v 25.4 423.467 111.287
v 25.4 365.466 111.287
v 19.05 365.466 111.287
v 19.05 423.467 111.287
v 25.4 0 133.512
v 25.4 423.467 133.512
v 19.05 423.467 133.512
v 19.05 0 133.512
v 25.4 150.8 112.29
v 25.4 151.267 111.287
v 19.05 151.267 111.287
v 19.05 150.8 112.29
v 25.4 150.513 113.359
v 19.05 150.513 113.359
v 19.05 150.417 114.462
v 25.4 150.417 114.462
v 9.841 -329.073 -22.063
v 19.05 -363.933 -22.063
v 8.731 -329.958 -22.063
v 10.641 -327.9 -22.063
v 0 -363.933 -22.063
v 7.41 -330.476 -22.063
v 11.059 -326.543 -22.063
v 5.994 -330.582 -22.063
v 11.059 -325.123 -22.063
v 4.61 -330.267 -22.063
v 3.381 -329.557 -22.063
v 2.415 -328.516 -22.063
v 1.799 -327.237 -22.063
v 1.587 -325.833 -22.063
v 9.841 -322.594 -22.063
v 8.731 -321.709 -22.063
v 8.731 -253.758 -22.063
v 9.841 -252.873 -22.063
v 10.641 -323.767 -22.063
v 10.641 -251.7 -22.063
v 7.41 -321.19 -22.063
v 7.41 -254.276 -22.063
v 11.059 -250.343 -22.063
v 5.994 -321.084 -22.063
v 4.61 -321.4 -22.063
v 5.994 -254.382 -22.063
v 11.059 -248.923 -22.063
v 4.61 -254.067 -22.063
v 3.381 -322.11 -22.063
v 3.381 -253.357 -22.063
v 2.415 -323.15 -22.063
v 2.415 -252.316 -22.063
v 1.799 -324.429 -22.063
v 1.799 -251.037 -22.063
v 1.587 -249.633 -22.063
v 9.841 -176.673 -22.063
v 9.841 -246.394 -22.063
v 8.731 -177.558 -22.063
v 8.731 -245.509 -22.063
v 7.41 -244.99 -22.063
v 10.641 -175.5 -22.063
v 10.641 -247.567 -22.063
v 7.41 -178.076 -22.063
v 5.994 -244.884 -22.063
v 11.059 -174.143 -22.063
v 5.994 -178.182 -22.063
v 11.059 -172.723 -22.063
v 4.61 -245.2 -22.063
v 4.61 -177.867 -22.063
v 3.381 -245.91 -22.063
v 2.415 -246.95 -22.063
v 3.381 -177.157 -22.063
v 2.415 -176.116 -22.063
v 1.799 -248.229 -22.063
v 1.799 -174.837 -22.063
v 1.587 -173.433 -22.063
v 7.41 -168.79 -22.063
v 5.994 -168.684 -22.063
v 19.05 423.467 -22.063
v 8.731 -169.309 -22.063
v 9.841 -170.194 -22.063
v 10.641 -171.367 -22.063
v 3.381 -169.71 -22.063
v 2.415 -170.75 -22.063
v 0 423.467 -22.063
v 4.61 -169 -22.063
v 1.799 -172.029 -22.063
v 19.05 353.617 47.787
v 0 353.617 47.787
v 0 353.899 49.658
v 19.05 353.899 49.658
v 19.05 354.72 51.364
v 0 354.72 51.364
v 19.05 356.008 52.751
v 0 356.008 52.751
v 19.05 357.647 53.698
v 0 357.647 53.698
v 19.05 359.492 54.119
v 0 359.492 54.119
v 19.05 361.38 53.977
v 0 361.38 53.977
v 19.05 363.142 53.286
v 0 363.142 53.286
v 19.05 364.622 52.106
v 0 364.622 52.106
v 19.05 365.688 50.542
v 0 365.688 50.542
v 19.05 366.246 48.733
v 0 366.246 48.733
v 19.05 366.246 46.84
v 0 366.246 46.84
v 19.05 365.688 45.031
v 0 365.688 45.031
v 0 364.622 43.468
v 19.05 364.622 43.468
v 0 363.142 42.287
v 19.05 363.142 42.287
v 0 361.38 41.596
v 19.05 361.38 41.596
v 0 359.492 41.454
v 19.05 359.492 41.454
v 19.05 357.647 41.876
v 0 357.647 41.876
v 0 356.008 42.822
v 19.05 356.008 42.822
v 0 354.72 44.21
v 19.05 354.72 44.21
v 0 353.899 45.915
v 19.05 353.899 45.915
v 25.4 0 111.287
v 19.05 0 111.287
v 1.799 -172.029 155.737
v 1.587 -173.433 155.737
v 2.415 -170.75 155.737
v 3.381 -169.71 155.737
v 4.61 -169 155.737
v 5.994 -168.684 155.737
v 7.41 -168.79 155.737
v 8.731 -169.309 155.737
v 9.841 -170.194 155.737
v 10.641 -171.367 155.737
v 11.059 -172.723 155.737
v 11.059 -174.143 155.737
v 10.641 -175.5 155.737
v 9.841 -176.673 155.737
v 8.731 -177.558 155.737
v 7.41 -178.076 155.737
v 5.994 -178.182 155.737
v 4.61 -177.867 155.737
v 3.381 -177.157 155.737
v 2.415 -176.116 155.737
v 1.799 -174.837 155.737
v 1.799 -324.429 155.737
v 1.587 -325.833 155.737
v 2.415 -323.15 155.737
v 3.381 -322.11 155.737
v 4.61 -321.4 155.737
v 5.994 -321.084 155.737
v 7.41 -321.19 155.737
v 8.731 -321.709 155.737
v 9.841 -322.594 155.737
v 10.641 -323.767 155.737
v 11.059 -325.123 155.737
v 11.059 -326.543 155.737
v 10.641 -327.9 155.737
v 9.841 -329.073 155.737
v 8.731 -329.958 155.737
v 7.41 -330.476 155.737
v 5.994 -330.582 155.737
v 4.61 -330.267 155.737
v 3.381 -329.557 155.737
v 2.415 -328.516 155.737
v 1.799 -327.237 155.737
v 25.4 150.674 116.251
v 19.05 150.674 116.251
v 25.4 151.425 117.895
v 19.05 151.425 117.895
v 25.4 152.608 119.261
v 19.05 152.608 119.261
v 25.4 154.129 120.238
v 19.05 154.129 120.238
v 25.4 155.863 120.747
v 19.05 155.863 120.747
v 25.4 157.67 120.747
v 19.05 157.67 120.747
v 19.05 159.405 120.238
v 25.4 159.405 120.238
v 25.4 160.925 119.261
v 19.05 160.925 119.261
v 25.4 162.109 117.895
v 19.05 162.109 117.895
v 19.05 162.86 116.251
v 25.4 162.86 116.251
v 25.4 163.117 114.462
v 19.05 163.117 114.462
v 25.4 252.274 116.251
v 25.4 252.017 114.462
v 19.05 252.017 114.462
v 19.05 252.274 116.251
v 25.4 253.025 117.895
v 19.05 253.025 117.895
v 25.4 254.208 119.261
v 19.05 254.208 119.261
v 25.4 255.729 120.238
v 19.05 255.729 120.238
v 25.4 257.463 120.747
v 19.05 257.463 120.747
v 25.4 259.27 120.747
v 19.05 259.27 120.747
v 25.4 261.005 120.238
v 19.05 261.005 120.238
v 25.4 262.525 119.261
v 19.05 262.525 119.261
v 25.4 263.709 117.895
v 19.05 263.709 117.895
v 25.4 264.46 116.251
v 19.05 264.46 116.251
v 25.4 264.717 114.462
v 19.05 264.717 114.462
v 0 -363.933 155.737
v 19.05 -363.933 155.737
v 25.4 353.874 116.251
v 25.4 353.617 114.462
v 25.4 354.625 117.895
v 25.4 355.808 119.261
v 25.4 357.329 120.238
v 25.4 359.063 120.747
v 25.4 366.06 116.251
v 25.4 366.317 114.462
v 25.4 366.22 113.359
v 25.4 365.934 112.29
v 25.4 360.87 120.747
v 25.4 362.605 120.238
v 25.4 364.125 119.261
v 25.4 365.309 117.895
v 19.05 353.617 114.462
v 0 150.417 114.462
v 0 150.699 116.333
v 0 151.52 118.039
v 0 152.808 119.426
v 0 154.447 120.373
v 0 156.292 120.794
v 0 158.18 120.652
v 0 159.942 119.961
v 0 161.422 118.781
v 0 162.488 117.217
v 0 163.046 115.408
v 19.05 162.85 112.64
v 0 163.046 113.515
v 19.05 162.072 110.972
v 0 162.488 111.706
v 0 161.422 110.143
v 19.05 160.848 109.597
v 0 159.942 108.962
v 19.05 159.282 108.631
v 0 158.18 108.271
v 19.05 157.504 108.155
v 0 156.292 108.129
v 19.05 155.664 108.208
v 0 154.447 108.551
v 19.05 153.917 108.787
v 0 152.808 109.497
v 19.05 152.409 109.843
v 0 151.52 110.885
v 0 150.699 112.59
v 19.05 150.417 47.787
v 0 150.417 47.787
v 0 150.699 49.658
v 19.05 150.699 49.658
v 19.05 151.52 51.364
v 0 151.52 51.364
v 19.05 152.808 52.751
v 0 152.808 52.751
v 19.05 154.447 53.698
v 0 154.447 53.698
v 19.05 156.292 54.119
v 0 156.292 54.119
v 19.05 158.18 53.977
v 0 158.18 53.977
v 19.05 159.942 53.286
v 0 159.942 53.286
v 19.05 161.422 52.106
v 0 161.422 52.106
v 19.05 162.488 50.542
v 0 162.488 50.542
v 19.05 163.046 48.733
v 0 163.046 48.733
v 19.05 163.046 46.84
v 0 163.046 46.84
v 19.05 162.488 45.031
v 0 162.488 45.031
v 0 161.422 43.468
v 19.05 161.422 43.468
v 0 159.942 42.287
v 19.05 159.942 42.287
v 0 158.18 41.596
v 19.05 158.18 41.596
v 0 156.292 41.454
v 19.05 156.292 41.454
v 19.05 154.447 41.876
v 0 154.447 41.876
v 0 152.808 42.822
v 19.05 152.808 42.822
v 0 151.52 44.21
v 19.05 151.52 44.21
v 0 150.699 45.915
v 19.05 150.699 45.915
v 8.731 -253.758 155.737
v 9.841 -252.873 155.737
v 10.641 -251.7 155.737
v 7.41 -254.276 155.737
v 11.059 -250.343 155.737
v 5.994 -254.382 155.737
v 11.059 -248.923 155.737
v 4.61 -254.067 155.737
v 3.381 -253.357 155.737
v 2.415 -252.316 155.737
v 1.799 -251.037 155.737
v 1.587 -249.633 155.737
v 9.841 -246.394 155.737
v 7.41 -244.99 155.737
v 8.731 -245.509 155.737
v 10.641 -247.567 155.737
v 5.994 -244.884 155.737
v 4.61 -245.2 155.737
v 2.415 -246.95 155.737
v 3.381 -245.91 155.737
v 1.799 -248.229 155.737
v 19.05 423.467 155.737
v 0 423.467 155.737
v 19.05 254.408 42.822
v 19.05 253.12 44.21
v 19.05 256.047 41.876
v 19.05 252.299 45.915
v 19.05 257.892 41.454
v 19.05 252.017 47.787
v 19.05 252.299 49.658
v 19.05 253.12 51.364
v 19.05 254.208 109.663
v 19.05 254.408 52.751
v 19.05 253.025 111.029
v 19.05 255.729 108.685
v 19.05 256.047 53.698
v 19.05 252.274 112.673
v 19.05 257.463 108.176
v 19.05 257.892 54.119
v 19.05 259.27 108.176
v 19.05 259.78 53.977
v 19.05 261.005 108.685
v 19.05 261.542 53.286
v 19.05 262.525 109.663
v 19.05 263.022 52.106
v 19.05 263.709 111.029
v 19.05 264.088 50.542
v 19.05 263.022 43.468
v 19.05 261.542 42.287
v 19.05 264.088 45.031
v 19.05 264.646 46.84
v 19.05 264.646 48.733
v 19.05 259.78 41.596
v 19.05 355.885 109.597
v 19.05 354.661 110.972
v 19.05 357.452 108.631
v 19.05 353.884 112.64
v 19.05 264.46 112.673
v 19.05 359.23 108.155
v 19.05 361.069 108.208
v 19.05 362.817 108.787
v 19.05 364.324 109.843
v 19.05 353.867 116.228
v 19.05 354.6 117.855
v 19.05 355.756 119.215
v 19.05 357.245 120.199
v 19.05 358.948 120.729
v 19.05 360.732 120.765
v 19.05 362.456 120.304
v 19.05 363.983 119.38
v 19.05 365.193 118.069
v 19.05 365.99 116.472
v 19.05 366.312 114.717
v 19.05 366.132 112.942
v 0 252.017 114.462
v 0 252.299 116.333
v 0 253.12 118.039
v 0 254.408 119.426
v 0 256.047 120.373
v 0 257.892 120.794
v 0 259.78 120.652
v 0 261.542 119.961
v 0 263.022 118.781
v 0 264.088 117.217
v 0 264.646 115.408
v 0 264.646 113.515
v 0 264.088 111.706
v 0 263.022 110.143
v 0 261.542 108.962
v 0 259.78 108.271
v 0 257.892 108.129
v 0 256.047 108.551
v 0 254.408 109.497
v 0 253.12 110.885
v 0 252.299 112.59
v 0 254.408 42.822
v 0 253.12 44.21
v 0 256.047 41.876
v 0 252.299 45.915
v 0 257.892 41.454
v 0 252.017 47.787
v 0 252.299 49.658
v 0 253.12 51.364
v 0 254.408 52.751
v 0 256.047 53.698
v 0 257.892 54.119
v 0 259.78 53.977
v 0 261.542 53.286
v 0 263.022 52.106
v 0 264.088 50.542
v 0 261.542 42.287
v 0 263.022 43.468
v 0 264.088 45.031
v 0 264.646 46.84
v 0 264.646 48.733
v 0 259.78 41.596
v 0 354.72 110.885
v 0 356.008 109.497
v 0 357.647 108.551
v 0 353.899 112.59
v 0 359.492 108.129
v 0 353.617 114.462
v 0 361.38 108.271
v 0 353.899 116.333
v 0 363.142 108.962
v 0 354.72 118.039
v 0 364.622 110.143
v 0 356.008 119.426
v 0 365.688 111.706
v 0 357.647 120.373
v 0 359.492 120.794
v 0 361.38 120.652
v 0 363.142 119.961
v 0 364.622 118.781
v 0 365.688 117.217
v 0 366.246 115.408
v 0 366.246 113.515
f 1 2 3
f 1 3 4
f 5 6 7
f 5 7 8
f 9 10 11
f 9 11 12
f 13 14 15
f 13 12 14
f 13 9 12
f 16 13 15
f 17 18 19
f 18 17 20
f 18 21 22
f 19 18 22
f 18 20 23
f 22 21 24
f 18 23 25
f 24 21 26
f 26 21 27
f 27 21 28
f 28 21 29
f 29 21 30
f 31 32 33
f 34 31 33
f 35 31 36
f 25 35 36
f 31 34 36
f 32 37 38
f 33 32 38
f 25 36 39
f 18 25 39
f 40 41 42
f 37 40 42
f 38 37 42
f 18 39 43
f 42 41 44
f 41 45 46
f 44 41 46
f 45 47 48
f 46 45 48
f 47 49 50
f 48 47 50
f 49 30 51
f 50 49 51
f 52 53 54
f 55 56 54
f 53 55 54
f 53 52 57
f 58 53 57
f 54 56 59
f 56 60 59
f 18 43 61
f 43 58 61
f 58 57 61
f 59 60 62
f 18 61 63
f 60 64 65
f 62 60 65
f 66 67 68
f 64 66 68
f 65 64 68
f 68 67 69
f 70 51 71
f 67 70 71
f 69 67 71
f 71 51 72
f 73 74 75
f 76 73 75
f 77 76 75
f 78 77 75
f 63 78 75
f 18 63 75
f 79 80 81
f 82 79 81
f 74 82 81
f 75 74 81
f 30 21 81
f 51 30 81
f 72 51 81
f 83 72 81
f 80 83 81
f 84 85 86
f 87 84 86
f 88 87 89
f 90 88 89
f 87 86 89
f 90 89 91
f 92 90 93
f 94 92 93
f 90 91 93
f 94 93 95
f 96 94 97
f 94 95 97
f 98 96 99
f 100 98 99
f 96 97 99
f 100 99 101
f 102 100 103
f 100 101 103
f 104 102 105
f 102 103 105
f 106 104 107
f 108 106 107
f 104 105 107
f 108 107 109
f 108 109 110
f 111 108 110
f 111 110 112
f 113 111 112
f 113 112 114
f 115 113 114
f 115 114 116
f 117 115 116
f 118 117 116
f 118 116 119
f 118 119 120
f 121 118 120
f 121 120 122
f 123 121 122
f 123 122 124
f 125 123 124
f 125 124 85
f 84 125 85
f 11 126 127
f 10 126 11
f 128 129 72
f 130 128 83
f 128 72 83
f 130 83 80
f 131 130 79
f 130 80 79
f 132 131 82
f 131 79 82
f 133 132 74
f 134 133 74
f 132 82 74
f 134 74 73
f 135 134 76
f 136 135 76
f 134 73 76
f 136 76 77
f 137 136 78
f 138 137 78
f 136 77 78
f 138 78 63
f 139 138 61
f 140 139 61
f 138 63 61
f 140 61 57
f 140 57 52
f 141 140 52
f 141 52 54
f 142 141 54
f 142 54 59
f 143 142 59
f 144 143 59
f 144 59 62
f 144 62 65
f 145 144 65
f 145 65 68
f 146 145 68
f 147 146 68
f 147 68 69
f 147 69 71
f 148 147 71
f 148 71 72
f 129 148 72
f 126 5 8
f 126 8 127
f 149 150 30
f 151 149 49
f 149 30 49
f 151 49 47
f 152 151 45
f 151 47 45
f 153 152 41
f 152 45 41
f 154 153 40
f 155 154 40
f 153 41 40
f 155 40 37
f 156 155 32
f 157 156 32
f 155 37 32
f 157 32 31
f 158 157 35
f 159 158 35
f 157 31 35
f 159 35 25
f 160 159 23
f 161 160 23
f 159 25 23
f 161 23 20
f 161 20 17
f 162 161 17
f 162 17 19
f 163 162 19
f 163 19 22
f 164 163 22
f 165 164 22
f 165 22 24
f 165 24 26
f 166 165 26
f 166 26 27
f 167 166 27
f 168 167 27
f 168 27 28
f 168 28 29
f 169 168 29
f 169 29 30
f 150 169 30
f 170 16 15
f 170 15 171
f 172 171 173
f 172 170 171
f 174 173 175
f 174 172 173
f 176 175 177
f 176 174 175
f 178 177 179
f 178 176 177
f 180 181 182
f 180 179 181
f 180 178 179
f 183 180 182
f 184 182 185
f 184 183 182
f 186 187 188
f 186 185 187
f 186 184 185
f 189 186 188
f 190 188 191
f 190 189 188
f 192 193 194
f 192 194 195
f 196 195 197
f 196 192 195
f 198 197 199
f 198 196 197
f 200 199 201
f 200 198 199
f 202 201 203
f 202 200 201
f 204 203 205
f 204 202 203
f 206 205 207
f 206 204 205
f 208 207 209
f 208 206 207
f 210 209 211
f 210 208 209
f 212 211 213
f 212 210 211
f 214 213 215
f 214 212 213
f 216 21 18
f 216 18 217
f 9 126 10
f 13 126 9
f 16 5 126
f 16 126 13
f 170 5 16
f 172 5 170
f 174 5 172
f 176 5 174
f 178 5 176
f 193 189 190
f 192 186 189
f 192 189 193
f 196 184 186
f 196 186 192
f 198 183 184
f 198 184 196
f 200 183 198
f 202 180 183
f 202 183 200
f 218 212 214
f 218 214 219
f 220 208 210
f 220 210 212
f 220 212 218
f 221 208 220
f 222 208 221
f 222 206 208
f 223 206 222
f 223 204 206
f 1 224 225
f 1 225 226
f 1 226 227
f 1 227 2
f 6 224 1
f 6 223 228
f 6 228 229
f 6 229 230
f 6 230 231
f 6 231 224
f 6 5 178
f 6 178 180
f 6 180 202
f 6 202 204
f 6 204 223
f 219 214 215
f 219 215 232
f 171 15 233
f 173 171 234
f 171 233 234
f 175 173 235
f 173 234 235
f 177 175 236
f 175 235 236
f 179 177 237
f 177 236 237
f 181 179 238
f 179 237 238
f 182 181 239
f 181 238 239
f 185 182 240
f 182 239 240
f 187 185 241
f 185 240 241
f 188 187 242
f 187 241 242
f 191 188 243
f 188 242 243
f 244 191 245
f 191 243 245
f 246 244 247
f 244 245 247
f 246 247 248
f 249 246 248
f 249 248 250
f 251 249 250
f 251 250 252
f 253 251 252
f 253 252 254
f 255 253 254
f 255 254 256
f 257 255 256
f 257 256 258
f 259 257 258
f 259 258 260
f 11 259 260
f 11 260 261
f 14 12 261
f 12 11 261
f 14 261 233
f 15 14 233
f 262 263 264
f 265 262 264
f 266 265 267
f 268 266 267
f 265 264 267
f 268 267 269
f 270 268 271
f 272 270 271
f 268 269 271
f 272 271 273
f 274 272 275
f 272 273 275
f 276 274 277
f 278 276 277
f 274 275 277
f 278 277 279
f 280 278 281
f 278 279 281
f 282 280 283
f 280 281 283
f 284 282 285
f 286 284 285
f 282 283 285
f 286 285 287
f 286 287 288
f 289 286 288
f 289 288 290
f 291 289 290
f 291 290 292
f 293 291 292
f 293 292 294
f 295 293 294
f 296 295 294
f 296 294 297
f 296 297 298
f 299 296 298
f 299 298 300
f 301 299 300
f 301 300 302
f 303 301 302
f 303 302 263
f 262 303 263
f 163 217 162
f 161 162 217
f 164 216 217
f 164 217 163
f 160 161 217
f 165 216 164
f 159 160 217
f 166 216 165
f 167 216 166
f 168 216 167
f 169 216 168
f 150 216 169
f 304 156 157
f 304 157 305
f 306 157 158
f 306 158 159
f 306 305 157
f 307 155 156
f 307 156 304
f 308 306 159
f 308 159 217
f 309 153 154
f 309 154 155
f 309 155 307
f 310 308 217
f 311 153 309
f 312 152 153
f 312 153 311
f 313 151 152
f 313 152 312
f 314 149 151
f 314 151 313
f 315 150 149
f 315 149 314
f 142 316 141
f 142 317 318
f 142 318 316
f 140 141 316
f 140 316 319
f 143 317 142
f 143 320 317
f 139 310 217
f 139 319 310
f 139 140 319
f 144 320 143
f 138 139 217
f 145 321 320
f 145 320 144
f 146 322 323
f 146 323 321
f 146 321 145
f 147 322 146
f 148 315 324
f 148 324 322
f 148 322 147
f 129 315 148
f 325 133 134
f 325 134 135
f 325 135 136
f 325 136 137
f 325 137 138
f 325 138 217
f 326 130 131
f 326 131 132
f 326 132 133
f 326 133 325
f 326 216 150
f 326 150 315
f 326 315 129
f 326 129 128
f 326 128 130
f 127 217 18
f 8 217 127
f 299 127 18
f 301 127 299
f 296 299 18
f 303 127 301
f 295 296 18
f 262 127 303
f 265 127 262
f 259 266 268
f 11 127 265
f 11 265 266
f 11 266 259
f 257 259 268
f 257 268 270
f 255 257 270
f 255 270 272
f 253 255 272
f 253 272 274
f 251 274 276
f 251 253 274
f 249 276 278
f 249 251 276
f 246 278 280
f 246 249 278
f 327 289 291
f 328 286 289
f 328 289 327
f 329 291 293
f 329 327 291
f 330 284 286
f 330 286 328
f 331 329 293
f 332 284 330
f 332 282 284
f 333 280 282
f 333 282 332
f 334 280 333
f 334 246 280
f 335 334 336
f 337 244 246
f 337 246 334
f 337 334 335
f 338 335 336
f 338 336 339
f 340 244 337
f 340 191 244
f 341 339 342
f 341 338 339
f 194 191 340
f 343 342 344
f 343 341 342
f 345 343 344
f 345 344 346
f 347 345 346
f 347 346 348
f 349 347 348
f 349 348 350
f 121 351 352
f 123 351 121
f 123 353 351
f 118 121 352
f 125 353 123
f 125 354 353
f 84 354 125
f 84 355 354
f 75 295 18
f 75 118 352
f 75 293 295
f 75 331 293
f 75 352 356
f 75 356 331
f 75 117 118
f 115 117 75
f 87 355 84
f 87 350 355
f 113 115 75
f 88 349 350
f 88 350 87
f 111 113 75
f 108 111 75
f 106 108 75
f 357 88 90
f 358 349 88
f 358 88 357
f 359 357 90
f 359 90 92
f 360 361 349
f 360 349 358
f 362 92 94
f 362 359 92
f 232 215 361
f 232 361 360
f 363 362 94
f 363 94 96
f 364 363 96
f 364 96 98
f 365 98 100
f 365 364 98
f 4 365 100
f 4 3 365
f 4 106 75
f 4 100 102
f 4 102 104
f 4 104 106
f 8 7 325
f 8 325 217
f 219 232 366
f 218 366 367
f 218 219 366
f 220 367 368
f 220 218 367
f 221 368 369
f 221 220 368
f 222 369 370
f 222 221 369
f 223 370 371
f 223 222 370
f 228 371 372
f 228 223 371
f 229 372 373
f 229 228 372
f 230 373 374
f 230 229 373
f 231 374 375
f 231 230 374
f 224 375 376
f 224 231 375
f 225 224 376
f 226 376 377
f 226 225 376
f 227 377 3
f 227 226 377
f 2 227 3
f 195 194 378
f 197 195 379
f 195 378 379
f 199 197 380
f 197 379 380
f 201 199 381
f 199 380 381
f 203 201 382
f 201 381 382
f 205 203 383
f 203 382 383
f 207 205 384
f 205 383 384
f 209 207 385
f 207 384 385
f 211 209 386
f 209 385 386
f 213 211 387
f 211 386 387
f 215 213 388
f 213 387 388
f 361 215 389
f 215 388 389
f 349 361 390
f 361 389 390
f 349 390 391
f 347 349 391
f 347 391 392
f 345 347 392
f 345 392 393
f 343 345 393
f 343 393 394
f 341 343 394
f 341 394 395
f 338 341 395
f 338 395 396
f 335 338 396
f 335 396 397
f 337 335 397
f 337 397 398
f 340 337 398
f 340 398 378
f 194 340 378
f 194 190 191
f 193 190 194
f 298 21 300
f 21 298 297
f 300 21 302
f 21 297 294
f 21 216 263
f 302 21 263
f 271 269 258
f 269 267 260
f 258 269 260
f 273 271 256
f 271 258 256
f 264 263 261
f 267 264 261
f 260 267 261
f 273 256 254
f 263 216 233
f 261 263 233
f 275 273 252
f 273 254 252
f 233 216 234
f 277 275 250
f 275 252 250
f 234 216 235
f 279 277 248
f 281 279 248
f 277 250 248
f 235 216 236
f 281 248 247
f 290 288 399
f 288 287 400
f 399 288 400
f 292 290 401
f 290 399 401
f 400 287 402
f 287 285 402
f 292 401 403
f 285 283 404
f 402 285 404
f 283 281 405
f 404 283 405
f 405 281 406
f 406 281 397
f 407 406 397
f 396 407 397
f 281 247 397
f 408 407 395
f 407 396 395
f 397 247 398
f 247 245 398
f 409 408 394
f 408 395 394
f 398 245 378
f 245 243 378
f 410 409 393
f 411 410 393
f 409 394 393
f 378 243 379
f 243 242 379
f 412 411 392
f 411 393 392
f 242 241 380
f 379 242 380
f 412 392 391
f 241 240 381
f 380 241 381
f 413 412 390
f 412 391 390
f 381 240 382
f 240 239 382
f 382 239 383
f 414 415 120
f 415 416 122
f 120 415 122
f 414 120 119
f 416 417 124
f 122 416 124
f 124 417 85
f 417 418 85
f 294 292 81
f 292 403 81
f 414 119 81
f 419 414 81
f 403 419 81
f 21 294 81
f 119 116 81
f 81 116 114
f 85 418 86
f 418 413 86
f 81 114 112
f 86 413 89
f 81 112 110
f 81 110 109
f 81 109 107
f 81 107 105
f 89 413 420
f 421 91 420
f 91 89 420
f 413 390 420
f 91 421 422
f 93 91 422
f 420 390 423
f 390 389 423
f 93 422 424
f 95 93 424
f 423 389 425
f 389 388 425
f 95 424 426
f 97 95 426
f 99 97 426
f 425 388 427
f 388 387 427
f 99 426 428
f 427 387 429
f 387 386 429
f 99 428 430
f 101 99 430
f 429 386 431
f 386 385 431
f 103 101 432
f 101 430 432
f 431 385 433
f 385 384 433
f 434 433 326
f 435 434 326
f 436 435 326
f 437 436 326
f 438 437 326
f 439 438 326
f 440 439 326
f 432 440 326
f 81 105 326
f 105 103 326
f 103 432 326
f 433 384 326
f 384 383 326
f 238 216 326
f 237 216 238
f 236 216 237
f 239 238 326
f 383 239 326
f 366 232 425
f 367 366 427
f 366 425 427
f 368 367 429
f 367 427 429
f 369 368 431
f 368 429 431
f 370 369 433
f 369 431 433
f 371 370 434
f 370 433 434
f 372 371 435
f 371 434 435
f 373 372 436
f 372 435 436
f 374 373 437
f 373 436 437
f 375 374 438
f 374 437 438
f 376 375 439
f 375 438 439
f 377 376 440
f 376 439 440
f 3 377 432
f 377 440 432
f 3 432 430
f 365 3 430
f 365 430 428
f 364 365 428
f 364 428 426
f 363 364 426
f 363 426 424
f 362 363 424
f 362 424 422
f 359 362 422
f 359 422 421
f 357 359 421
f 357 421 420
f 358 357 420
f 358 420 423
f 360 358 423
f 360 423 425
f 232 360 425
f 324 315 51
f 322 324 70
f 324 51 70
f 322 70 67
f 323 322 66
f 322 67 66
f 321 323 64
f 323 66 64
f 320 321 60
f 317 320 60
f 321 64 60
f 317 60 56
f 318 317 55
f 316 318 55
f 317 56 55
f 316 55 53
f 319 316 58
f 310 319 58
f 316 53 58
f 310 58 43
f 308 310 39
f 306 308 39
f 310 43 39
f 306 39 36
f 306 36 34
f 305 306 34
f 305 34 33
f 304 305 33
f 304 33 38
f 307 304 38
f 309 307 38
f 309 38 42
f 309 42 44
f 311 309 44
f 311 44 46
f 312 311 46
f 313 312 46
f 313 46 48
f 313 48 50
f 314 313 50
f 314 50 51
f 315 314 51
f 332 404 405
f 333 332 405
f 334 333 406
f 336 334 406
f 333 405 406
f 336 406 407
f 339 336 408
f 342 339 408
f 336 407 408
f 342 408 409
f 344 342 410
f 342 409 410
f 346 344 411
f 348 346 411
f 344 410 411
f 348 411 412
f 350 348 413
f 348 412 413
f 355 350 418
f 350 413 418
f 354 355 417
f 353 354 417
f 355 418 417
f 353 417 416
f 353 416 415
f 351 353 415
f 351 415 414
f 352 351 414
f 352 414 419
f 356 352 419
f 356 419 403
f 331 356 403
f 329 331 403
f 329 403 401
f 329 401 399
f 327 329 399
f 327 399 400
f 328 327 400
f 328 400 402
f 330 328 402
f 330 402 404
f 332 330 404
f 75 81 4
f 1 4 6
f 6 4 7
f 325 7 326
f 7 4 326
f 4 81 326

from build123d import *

# Parameters (mm, degrees)
F0_W     = 787.4
F0_H     = 177.8
F1_DEPTH = 19.05
F4_D     = 12.7
F5_D     = 9.525
F7_DEPTH = 6.35
F8_D     = 12.7


with BuildPart() as f1:
    # F0 (on Right) → F1 (new body)
    with BuildSketch(Plane.YZ):
        with Locations((29.7667551786, 66.8366326568)):
            Rectangle(F0_W, F0_H)
    extrude(amount=F1_DEPTH)

    # F4 (through all)
    with Locations(Plane.YZ.offset(19.05)):
        with Locations((156.7667551786, 47.7866326568), (258.3667551786, 47.7866326568), (359.9667551786, 47.7866326568)):
            Hole(F4_D / 2)

    # F5 (through all)
    with Locations(Plane.XY.offset(155.7366326568)):
        with Locations((6.35, -173.4332448214), (6.35, -249.6332448214), (6.35, -325.8332448214)):
            Hole(F5_D / 2)

    # F6 (on face) → F7 (join, symmetric)
    with BuildSketch(Plane.YZ.offset(19.05)):
        with BuildLine():
            Line((423.4667551786, 111.2866326568), (423.4667551786, 133.5116326568))
            Line((423.4667551786, 133.5116326568), (0, 133.5116326568))
            Line((0, 133.5116326568), (0, 111.2866326568))
            Line((0, 111.2866326568), (151.2674938645, 111.2866326568))
            ThreePointArc((151.2674938645, 111.2866326568), (155.1232542422, 120.5952616538), (163.1167551786, 114.4616326568))
            Line((163.1167551786, 114.4616326568), (252.0167551786, 114.4616326568))
            ThreePointArc((252.0167551786, 114.4616326568), (258.3667551786, 120.8116326568), (264.7167551786, 114.4616326568))
            Line((264.7167551786, 114.4616326568), (353.6167551786, 114.4616326568))
            ThreePointArc((353.6167551786, 114.4616326568), (359.9667551786, 120.8116326568), (366.3167551786, 114.4616326568))
            ThreePointArc((366.3167551786, 114.4616326568), (366.1003841755, 112.8181317204), (365.4660164926, 111.2866326568))
            Line((365.4660164926, 111.2866326568), (423.4667551786, 111.2866326568))
        make_face()
    extrude(amount=F7_DEPTH, both=True)

    # F8 (through all)
    with Locations(Plane.YZ.offset(19.05)):
        with Locations((359.9667551786, 114.4616326568), (258.3667551786, 114.4616326568), (156.7667551786, 114.4616326568)):
            Hole(F8_D / 2)


solid = f1.part
